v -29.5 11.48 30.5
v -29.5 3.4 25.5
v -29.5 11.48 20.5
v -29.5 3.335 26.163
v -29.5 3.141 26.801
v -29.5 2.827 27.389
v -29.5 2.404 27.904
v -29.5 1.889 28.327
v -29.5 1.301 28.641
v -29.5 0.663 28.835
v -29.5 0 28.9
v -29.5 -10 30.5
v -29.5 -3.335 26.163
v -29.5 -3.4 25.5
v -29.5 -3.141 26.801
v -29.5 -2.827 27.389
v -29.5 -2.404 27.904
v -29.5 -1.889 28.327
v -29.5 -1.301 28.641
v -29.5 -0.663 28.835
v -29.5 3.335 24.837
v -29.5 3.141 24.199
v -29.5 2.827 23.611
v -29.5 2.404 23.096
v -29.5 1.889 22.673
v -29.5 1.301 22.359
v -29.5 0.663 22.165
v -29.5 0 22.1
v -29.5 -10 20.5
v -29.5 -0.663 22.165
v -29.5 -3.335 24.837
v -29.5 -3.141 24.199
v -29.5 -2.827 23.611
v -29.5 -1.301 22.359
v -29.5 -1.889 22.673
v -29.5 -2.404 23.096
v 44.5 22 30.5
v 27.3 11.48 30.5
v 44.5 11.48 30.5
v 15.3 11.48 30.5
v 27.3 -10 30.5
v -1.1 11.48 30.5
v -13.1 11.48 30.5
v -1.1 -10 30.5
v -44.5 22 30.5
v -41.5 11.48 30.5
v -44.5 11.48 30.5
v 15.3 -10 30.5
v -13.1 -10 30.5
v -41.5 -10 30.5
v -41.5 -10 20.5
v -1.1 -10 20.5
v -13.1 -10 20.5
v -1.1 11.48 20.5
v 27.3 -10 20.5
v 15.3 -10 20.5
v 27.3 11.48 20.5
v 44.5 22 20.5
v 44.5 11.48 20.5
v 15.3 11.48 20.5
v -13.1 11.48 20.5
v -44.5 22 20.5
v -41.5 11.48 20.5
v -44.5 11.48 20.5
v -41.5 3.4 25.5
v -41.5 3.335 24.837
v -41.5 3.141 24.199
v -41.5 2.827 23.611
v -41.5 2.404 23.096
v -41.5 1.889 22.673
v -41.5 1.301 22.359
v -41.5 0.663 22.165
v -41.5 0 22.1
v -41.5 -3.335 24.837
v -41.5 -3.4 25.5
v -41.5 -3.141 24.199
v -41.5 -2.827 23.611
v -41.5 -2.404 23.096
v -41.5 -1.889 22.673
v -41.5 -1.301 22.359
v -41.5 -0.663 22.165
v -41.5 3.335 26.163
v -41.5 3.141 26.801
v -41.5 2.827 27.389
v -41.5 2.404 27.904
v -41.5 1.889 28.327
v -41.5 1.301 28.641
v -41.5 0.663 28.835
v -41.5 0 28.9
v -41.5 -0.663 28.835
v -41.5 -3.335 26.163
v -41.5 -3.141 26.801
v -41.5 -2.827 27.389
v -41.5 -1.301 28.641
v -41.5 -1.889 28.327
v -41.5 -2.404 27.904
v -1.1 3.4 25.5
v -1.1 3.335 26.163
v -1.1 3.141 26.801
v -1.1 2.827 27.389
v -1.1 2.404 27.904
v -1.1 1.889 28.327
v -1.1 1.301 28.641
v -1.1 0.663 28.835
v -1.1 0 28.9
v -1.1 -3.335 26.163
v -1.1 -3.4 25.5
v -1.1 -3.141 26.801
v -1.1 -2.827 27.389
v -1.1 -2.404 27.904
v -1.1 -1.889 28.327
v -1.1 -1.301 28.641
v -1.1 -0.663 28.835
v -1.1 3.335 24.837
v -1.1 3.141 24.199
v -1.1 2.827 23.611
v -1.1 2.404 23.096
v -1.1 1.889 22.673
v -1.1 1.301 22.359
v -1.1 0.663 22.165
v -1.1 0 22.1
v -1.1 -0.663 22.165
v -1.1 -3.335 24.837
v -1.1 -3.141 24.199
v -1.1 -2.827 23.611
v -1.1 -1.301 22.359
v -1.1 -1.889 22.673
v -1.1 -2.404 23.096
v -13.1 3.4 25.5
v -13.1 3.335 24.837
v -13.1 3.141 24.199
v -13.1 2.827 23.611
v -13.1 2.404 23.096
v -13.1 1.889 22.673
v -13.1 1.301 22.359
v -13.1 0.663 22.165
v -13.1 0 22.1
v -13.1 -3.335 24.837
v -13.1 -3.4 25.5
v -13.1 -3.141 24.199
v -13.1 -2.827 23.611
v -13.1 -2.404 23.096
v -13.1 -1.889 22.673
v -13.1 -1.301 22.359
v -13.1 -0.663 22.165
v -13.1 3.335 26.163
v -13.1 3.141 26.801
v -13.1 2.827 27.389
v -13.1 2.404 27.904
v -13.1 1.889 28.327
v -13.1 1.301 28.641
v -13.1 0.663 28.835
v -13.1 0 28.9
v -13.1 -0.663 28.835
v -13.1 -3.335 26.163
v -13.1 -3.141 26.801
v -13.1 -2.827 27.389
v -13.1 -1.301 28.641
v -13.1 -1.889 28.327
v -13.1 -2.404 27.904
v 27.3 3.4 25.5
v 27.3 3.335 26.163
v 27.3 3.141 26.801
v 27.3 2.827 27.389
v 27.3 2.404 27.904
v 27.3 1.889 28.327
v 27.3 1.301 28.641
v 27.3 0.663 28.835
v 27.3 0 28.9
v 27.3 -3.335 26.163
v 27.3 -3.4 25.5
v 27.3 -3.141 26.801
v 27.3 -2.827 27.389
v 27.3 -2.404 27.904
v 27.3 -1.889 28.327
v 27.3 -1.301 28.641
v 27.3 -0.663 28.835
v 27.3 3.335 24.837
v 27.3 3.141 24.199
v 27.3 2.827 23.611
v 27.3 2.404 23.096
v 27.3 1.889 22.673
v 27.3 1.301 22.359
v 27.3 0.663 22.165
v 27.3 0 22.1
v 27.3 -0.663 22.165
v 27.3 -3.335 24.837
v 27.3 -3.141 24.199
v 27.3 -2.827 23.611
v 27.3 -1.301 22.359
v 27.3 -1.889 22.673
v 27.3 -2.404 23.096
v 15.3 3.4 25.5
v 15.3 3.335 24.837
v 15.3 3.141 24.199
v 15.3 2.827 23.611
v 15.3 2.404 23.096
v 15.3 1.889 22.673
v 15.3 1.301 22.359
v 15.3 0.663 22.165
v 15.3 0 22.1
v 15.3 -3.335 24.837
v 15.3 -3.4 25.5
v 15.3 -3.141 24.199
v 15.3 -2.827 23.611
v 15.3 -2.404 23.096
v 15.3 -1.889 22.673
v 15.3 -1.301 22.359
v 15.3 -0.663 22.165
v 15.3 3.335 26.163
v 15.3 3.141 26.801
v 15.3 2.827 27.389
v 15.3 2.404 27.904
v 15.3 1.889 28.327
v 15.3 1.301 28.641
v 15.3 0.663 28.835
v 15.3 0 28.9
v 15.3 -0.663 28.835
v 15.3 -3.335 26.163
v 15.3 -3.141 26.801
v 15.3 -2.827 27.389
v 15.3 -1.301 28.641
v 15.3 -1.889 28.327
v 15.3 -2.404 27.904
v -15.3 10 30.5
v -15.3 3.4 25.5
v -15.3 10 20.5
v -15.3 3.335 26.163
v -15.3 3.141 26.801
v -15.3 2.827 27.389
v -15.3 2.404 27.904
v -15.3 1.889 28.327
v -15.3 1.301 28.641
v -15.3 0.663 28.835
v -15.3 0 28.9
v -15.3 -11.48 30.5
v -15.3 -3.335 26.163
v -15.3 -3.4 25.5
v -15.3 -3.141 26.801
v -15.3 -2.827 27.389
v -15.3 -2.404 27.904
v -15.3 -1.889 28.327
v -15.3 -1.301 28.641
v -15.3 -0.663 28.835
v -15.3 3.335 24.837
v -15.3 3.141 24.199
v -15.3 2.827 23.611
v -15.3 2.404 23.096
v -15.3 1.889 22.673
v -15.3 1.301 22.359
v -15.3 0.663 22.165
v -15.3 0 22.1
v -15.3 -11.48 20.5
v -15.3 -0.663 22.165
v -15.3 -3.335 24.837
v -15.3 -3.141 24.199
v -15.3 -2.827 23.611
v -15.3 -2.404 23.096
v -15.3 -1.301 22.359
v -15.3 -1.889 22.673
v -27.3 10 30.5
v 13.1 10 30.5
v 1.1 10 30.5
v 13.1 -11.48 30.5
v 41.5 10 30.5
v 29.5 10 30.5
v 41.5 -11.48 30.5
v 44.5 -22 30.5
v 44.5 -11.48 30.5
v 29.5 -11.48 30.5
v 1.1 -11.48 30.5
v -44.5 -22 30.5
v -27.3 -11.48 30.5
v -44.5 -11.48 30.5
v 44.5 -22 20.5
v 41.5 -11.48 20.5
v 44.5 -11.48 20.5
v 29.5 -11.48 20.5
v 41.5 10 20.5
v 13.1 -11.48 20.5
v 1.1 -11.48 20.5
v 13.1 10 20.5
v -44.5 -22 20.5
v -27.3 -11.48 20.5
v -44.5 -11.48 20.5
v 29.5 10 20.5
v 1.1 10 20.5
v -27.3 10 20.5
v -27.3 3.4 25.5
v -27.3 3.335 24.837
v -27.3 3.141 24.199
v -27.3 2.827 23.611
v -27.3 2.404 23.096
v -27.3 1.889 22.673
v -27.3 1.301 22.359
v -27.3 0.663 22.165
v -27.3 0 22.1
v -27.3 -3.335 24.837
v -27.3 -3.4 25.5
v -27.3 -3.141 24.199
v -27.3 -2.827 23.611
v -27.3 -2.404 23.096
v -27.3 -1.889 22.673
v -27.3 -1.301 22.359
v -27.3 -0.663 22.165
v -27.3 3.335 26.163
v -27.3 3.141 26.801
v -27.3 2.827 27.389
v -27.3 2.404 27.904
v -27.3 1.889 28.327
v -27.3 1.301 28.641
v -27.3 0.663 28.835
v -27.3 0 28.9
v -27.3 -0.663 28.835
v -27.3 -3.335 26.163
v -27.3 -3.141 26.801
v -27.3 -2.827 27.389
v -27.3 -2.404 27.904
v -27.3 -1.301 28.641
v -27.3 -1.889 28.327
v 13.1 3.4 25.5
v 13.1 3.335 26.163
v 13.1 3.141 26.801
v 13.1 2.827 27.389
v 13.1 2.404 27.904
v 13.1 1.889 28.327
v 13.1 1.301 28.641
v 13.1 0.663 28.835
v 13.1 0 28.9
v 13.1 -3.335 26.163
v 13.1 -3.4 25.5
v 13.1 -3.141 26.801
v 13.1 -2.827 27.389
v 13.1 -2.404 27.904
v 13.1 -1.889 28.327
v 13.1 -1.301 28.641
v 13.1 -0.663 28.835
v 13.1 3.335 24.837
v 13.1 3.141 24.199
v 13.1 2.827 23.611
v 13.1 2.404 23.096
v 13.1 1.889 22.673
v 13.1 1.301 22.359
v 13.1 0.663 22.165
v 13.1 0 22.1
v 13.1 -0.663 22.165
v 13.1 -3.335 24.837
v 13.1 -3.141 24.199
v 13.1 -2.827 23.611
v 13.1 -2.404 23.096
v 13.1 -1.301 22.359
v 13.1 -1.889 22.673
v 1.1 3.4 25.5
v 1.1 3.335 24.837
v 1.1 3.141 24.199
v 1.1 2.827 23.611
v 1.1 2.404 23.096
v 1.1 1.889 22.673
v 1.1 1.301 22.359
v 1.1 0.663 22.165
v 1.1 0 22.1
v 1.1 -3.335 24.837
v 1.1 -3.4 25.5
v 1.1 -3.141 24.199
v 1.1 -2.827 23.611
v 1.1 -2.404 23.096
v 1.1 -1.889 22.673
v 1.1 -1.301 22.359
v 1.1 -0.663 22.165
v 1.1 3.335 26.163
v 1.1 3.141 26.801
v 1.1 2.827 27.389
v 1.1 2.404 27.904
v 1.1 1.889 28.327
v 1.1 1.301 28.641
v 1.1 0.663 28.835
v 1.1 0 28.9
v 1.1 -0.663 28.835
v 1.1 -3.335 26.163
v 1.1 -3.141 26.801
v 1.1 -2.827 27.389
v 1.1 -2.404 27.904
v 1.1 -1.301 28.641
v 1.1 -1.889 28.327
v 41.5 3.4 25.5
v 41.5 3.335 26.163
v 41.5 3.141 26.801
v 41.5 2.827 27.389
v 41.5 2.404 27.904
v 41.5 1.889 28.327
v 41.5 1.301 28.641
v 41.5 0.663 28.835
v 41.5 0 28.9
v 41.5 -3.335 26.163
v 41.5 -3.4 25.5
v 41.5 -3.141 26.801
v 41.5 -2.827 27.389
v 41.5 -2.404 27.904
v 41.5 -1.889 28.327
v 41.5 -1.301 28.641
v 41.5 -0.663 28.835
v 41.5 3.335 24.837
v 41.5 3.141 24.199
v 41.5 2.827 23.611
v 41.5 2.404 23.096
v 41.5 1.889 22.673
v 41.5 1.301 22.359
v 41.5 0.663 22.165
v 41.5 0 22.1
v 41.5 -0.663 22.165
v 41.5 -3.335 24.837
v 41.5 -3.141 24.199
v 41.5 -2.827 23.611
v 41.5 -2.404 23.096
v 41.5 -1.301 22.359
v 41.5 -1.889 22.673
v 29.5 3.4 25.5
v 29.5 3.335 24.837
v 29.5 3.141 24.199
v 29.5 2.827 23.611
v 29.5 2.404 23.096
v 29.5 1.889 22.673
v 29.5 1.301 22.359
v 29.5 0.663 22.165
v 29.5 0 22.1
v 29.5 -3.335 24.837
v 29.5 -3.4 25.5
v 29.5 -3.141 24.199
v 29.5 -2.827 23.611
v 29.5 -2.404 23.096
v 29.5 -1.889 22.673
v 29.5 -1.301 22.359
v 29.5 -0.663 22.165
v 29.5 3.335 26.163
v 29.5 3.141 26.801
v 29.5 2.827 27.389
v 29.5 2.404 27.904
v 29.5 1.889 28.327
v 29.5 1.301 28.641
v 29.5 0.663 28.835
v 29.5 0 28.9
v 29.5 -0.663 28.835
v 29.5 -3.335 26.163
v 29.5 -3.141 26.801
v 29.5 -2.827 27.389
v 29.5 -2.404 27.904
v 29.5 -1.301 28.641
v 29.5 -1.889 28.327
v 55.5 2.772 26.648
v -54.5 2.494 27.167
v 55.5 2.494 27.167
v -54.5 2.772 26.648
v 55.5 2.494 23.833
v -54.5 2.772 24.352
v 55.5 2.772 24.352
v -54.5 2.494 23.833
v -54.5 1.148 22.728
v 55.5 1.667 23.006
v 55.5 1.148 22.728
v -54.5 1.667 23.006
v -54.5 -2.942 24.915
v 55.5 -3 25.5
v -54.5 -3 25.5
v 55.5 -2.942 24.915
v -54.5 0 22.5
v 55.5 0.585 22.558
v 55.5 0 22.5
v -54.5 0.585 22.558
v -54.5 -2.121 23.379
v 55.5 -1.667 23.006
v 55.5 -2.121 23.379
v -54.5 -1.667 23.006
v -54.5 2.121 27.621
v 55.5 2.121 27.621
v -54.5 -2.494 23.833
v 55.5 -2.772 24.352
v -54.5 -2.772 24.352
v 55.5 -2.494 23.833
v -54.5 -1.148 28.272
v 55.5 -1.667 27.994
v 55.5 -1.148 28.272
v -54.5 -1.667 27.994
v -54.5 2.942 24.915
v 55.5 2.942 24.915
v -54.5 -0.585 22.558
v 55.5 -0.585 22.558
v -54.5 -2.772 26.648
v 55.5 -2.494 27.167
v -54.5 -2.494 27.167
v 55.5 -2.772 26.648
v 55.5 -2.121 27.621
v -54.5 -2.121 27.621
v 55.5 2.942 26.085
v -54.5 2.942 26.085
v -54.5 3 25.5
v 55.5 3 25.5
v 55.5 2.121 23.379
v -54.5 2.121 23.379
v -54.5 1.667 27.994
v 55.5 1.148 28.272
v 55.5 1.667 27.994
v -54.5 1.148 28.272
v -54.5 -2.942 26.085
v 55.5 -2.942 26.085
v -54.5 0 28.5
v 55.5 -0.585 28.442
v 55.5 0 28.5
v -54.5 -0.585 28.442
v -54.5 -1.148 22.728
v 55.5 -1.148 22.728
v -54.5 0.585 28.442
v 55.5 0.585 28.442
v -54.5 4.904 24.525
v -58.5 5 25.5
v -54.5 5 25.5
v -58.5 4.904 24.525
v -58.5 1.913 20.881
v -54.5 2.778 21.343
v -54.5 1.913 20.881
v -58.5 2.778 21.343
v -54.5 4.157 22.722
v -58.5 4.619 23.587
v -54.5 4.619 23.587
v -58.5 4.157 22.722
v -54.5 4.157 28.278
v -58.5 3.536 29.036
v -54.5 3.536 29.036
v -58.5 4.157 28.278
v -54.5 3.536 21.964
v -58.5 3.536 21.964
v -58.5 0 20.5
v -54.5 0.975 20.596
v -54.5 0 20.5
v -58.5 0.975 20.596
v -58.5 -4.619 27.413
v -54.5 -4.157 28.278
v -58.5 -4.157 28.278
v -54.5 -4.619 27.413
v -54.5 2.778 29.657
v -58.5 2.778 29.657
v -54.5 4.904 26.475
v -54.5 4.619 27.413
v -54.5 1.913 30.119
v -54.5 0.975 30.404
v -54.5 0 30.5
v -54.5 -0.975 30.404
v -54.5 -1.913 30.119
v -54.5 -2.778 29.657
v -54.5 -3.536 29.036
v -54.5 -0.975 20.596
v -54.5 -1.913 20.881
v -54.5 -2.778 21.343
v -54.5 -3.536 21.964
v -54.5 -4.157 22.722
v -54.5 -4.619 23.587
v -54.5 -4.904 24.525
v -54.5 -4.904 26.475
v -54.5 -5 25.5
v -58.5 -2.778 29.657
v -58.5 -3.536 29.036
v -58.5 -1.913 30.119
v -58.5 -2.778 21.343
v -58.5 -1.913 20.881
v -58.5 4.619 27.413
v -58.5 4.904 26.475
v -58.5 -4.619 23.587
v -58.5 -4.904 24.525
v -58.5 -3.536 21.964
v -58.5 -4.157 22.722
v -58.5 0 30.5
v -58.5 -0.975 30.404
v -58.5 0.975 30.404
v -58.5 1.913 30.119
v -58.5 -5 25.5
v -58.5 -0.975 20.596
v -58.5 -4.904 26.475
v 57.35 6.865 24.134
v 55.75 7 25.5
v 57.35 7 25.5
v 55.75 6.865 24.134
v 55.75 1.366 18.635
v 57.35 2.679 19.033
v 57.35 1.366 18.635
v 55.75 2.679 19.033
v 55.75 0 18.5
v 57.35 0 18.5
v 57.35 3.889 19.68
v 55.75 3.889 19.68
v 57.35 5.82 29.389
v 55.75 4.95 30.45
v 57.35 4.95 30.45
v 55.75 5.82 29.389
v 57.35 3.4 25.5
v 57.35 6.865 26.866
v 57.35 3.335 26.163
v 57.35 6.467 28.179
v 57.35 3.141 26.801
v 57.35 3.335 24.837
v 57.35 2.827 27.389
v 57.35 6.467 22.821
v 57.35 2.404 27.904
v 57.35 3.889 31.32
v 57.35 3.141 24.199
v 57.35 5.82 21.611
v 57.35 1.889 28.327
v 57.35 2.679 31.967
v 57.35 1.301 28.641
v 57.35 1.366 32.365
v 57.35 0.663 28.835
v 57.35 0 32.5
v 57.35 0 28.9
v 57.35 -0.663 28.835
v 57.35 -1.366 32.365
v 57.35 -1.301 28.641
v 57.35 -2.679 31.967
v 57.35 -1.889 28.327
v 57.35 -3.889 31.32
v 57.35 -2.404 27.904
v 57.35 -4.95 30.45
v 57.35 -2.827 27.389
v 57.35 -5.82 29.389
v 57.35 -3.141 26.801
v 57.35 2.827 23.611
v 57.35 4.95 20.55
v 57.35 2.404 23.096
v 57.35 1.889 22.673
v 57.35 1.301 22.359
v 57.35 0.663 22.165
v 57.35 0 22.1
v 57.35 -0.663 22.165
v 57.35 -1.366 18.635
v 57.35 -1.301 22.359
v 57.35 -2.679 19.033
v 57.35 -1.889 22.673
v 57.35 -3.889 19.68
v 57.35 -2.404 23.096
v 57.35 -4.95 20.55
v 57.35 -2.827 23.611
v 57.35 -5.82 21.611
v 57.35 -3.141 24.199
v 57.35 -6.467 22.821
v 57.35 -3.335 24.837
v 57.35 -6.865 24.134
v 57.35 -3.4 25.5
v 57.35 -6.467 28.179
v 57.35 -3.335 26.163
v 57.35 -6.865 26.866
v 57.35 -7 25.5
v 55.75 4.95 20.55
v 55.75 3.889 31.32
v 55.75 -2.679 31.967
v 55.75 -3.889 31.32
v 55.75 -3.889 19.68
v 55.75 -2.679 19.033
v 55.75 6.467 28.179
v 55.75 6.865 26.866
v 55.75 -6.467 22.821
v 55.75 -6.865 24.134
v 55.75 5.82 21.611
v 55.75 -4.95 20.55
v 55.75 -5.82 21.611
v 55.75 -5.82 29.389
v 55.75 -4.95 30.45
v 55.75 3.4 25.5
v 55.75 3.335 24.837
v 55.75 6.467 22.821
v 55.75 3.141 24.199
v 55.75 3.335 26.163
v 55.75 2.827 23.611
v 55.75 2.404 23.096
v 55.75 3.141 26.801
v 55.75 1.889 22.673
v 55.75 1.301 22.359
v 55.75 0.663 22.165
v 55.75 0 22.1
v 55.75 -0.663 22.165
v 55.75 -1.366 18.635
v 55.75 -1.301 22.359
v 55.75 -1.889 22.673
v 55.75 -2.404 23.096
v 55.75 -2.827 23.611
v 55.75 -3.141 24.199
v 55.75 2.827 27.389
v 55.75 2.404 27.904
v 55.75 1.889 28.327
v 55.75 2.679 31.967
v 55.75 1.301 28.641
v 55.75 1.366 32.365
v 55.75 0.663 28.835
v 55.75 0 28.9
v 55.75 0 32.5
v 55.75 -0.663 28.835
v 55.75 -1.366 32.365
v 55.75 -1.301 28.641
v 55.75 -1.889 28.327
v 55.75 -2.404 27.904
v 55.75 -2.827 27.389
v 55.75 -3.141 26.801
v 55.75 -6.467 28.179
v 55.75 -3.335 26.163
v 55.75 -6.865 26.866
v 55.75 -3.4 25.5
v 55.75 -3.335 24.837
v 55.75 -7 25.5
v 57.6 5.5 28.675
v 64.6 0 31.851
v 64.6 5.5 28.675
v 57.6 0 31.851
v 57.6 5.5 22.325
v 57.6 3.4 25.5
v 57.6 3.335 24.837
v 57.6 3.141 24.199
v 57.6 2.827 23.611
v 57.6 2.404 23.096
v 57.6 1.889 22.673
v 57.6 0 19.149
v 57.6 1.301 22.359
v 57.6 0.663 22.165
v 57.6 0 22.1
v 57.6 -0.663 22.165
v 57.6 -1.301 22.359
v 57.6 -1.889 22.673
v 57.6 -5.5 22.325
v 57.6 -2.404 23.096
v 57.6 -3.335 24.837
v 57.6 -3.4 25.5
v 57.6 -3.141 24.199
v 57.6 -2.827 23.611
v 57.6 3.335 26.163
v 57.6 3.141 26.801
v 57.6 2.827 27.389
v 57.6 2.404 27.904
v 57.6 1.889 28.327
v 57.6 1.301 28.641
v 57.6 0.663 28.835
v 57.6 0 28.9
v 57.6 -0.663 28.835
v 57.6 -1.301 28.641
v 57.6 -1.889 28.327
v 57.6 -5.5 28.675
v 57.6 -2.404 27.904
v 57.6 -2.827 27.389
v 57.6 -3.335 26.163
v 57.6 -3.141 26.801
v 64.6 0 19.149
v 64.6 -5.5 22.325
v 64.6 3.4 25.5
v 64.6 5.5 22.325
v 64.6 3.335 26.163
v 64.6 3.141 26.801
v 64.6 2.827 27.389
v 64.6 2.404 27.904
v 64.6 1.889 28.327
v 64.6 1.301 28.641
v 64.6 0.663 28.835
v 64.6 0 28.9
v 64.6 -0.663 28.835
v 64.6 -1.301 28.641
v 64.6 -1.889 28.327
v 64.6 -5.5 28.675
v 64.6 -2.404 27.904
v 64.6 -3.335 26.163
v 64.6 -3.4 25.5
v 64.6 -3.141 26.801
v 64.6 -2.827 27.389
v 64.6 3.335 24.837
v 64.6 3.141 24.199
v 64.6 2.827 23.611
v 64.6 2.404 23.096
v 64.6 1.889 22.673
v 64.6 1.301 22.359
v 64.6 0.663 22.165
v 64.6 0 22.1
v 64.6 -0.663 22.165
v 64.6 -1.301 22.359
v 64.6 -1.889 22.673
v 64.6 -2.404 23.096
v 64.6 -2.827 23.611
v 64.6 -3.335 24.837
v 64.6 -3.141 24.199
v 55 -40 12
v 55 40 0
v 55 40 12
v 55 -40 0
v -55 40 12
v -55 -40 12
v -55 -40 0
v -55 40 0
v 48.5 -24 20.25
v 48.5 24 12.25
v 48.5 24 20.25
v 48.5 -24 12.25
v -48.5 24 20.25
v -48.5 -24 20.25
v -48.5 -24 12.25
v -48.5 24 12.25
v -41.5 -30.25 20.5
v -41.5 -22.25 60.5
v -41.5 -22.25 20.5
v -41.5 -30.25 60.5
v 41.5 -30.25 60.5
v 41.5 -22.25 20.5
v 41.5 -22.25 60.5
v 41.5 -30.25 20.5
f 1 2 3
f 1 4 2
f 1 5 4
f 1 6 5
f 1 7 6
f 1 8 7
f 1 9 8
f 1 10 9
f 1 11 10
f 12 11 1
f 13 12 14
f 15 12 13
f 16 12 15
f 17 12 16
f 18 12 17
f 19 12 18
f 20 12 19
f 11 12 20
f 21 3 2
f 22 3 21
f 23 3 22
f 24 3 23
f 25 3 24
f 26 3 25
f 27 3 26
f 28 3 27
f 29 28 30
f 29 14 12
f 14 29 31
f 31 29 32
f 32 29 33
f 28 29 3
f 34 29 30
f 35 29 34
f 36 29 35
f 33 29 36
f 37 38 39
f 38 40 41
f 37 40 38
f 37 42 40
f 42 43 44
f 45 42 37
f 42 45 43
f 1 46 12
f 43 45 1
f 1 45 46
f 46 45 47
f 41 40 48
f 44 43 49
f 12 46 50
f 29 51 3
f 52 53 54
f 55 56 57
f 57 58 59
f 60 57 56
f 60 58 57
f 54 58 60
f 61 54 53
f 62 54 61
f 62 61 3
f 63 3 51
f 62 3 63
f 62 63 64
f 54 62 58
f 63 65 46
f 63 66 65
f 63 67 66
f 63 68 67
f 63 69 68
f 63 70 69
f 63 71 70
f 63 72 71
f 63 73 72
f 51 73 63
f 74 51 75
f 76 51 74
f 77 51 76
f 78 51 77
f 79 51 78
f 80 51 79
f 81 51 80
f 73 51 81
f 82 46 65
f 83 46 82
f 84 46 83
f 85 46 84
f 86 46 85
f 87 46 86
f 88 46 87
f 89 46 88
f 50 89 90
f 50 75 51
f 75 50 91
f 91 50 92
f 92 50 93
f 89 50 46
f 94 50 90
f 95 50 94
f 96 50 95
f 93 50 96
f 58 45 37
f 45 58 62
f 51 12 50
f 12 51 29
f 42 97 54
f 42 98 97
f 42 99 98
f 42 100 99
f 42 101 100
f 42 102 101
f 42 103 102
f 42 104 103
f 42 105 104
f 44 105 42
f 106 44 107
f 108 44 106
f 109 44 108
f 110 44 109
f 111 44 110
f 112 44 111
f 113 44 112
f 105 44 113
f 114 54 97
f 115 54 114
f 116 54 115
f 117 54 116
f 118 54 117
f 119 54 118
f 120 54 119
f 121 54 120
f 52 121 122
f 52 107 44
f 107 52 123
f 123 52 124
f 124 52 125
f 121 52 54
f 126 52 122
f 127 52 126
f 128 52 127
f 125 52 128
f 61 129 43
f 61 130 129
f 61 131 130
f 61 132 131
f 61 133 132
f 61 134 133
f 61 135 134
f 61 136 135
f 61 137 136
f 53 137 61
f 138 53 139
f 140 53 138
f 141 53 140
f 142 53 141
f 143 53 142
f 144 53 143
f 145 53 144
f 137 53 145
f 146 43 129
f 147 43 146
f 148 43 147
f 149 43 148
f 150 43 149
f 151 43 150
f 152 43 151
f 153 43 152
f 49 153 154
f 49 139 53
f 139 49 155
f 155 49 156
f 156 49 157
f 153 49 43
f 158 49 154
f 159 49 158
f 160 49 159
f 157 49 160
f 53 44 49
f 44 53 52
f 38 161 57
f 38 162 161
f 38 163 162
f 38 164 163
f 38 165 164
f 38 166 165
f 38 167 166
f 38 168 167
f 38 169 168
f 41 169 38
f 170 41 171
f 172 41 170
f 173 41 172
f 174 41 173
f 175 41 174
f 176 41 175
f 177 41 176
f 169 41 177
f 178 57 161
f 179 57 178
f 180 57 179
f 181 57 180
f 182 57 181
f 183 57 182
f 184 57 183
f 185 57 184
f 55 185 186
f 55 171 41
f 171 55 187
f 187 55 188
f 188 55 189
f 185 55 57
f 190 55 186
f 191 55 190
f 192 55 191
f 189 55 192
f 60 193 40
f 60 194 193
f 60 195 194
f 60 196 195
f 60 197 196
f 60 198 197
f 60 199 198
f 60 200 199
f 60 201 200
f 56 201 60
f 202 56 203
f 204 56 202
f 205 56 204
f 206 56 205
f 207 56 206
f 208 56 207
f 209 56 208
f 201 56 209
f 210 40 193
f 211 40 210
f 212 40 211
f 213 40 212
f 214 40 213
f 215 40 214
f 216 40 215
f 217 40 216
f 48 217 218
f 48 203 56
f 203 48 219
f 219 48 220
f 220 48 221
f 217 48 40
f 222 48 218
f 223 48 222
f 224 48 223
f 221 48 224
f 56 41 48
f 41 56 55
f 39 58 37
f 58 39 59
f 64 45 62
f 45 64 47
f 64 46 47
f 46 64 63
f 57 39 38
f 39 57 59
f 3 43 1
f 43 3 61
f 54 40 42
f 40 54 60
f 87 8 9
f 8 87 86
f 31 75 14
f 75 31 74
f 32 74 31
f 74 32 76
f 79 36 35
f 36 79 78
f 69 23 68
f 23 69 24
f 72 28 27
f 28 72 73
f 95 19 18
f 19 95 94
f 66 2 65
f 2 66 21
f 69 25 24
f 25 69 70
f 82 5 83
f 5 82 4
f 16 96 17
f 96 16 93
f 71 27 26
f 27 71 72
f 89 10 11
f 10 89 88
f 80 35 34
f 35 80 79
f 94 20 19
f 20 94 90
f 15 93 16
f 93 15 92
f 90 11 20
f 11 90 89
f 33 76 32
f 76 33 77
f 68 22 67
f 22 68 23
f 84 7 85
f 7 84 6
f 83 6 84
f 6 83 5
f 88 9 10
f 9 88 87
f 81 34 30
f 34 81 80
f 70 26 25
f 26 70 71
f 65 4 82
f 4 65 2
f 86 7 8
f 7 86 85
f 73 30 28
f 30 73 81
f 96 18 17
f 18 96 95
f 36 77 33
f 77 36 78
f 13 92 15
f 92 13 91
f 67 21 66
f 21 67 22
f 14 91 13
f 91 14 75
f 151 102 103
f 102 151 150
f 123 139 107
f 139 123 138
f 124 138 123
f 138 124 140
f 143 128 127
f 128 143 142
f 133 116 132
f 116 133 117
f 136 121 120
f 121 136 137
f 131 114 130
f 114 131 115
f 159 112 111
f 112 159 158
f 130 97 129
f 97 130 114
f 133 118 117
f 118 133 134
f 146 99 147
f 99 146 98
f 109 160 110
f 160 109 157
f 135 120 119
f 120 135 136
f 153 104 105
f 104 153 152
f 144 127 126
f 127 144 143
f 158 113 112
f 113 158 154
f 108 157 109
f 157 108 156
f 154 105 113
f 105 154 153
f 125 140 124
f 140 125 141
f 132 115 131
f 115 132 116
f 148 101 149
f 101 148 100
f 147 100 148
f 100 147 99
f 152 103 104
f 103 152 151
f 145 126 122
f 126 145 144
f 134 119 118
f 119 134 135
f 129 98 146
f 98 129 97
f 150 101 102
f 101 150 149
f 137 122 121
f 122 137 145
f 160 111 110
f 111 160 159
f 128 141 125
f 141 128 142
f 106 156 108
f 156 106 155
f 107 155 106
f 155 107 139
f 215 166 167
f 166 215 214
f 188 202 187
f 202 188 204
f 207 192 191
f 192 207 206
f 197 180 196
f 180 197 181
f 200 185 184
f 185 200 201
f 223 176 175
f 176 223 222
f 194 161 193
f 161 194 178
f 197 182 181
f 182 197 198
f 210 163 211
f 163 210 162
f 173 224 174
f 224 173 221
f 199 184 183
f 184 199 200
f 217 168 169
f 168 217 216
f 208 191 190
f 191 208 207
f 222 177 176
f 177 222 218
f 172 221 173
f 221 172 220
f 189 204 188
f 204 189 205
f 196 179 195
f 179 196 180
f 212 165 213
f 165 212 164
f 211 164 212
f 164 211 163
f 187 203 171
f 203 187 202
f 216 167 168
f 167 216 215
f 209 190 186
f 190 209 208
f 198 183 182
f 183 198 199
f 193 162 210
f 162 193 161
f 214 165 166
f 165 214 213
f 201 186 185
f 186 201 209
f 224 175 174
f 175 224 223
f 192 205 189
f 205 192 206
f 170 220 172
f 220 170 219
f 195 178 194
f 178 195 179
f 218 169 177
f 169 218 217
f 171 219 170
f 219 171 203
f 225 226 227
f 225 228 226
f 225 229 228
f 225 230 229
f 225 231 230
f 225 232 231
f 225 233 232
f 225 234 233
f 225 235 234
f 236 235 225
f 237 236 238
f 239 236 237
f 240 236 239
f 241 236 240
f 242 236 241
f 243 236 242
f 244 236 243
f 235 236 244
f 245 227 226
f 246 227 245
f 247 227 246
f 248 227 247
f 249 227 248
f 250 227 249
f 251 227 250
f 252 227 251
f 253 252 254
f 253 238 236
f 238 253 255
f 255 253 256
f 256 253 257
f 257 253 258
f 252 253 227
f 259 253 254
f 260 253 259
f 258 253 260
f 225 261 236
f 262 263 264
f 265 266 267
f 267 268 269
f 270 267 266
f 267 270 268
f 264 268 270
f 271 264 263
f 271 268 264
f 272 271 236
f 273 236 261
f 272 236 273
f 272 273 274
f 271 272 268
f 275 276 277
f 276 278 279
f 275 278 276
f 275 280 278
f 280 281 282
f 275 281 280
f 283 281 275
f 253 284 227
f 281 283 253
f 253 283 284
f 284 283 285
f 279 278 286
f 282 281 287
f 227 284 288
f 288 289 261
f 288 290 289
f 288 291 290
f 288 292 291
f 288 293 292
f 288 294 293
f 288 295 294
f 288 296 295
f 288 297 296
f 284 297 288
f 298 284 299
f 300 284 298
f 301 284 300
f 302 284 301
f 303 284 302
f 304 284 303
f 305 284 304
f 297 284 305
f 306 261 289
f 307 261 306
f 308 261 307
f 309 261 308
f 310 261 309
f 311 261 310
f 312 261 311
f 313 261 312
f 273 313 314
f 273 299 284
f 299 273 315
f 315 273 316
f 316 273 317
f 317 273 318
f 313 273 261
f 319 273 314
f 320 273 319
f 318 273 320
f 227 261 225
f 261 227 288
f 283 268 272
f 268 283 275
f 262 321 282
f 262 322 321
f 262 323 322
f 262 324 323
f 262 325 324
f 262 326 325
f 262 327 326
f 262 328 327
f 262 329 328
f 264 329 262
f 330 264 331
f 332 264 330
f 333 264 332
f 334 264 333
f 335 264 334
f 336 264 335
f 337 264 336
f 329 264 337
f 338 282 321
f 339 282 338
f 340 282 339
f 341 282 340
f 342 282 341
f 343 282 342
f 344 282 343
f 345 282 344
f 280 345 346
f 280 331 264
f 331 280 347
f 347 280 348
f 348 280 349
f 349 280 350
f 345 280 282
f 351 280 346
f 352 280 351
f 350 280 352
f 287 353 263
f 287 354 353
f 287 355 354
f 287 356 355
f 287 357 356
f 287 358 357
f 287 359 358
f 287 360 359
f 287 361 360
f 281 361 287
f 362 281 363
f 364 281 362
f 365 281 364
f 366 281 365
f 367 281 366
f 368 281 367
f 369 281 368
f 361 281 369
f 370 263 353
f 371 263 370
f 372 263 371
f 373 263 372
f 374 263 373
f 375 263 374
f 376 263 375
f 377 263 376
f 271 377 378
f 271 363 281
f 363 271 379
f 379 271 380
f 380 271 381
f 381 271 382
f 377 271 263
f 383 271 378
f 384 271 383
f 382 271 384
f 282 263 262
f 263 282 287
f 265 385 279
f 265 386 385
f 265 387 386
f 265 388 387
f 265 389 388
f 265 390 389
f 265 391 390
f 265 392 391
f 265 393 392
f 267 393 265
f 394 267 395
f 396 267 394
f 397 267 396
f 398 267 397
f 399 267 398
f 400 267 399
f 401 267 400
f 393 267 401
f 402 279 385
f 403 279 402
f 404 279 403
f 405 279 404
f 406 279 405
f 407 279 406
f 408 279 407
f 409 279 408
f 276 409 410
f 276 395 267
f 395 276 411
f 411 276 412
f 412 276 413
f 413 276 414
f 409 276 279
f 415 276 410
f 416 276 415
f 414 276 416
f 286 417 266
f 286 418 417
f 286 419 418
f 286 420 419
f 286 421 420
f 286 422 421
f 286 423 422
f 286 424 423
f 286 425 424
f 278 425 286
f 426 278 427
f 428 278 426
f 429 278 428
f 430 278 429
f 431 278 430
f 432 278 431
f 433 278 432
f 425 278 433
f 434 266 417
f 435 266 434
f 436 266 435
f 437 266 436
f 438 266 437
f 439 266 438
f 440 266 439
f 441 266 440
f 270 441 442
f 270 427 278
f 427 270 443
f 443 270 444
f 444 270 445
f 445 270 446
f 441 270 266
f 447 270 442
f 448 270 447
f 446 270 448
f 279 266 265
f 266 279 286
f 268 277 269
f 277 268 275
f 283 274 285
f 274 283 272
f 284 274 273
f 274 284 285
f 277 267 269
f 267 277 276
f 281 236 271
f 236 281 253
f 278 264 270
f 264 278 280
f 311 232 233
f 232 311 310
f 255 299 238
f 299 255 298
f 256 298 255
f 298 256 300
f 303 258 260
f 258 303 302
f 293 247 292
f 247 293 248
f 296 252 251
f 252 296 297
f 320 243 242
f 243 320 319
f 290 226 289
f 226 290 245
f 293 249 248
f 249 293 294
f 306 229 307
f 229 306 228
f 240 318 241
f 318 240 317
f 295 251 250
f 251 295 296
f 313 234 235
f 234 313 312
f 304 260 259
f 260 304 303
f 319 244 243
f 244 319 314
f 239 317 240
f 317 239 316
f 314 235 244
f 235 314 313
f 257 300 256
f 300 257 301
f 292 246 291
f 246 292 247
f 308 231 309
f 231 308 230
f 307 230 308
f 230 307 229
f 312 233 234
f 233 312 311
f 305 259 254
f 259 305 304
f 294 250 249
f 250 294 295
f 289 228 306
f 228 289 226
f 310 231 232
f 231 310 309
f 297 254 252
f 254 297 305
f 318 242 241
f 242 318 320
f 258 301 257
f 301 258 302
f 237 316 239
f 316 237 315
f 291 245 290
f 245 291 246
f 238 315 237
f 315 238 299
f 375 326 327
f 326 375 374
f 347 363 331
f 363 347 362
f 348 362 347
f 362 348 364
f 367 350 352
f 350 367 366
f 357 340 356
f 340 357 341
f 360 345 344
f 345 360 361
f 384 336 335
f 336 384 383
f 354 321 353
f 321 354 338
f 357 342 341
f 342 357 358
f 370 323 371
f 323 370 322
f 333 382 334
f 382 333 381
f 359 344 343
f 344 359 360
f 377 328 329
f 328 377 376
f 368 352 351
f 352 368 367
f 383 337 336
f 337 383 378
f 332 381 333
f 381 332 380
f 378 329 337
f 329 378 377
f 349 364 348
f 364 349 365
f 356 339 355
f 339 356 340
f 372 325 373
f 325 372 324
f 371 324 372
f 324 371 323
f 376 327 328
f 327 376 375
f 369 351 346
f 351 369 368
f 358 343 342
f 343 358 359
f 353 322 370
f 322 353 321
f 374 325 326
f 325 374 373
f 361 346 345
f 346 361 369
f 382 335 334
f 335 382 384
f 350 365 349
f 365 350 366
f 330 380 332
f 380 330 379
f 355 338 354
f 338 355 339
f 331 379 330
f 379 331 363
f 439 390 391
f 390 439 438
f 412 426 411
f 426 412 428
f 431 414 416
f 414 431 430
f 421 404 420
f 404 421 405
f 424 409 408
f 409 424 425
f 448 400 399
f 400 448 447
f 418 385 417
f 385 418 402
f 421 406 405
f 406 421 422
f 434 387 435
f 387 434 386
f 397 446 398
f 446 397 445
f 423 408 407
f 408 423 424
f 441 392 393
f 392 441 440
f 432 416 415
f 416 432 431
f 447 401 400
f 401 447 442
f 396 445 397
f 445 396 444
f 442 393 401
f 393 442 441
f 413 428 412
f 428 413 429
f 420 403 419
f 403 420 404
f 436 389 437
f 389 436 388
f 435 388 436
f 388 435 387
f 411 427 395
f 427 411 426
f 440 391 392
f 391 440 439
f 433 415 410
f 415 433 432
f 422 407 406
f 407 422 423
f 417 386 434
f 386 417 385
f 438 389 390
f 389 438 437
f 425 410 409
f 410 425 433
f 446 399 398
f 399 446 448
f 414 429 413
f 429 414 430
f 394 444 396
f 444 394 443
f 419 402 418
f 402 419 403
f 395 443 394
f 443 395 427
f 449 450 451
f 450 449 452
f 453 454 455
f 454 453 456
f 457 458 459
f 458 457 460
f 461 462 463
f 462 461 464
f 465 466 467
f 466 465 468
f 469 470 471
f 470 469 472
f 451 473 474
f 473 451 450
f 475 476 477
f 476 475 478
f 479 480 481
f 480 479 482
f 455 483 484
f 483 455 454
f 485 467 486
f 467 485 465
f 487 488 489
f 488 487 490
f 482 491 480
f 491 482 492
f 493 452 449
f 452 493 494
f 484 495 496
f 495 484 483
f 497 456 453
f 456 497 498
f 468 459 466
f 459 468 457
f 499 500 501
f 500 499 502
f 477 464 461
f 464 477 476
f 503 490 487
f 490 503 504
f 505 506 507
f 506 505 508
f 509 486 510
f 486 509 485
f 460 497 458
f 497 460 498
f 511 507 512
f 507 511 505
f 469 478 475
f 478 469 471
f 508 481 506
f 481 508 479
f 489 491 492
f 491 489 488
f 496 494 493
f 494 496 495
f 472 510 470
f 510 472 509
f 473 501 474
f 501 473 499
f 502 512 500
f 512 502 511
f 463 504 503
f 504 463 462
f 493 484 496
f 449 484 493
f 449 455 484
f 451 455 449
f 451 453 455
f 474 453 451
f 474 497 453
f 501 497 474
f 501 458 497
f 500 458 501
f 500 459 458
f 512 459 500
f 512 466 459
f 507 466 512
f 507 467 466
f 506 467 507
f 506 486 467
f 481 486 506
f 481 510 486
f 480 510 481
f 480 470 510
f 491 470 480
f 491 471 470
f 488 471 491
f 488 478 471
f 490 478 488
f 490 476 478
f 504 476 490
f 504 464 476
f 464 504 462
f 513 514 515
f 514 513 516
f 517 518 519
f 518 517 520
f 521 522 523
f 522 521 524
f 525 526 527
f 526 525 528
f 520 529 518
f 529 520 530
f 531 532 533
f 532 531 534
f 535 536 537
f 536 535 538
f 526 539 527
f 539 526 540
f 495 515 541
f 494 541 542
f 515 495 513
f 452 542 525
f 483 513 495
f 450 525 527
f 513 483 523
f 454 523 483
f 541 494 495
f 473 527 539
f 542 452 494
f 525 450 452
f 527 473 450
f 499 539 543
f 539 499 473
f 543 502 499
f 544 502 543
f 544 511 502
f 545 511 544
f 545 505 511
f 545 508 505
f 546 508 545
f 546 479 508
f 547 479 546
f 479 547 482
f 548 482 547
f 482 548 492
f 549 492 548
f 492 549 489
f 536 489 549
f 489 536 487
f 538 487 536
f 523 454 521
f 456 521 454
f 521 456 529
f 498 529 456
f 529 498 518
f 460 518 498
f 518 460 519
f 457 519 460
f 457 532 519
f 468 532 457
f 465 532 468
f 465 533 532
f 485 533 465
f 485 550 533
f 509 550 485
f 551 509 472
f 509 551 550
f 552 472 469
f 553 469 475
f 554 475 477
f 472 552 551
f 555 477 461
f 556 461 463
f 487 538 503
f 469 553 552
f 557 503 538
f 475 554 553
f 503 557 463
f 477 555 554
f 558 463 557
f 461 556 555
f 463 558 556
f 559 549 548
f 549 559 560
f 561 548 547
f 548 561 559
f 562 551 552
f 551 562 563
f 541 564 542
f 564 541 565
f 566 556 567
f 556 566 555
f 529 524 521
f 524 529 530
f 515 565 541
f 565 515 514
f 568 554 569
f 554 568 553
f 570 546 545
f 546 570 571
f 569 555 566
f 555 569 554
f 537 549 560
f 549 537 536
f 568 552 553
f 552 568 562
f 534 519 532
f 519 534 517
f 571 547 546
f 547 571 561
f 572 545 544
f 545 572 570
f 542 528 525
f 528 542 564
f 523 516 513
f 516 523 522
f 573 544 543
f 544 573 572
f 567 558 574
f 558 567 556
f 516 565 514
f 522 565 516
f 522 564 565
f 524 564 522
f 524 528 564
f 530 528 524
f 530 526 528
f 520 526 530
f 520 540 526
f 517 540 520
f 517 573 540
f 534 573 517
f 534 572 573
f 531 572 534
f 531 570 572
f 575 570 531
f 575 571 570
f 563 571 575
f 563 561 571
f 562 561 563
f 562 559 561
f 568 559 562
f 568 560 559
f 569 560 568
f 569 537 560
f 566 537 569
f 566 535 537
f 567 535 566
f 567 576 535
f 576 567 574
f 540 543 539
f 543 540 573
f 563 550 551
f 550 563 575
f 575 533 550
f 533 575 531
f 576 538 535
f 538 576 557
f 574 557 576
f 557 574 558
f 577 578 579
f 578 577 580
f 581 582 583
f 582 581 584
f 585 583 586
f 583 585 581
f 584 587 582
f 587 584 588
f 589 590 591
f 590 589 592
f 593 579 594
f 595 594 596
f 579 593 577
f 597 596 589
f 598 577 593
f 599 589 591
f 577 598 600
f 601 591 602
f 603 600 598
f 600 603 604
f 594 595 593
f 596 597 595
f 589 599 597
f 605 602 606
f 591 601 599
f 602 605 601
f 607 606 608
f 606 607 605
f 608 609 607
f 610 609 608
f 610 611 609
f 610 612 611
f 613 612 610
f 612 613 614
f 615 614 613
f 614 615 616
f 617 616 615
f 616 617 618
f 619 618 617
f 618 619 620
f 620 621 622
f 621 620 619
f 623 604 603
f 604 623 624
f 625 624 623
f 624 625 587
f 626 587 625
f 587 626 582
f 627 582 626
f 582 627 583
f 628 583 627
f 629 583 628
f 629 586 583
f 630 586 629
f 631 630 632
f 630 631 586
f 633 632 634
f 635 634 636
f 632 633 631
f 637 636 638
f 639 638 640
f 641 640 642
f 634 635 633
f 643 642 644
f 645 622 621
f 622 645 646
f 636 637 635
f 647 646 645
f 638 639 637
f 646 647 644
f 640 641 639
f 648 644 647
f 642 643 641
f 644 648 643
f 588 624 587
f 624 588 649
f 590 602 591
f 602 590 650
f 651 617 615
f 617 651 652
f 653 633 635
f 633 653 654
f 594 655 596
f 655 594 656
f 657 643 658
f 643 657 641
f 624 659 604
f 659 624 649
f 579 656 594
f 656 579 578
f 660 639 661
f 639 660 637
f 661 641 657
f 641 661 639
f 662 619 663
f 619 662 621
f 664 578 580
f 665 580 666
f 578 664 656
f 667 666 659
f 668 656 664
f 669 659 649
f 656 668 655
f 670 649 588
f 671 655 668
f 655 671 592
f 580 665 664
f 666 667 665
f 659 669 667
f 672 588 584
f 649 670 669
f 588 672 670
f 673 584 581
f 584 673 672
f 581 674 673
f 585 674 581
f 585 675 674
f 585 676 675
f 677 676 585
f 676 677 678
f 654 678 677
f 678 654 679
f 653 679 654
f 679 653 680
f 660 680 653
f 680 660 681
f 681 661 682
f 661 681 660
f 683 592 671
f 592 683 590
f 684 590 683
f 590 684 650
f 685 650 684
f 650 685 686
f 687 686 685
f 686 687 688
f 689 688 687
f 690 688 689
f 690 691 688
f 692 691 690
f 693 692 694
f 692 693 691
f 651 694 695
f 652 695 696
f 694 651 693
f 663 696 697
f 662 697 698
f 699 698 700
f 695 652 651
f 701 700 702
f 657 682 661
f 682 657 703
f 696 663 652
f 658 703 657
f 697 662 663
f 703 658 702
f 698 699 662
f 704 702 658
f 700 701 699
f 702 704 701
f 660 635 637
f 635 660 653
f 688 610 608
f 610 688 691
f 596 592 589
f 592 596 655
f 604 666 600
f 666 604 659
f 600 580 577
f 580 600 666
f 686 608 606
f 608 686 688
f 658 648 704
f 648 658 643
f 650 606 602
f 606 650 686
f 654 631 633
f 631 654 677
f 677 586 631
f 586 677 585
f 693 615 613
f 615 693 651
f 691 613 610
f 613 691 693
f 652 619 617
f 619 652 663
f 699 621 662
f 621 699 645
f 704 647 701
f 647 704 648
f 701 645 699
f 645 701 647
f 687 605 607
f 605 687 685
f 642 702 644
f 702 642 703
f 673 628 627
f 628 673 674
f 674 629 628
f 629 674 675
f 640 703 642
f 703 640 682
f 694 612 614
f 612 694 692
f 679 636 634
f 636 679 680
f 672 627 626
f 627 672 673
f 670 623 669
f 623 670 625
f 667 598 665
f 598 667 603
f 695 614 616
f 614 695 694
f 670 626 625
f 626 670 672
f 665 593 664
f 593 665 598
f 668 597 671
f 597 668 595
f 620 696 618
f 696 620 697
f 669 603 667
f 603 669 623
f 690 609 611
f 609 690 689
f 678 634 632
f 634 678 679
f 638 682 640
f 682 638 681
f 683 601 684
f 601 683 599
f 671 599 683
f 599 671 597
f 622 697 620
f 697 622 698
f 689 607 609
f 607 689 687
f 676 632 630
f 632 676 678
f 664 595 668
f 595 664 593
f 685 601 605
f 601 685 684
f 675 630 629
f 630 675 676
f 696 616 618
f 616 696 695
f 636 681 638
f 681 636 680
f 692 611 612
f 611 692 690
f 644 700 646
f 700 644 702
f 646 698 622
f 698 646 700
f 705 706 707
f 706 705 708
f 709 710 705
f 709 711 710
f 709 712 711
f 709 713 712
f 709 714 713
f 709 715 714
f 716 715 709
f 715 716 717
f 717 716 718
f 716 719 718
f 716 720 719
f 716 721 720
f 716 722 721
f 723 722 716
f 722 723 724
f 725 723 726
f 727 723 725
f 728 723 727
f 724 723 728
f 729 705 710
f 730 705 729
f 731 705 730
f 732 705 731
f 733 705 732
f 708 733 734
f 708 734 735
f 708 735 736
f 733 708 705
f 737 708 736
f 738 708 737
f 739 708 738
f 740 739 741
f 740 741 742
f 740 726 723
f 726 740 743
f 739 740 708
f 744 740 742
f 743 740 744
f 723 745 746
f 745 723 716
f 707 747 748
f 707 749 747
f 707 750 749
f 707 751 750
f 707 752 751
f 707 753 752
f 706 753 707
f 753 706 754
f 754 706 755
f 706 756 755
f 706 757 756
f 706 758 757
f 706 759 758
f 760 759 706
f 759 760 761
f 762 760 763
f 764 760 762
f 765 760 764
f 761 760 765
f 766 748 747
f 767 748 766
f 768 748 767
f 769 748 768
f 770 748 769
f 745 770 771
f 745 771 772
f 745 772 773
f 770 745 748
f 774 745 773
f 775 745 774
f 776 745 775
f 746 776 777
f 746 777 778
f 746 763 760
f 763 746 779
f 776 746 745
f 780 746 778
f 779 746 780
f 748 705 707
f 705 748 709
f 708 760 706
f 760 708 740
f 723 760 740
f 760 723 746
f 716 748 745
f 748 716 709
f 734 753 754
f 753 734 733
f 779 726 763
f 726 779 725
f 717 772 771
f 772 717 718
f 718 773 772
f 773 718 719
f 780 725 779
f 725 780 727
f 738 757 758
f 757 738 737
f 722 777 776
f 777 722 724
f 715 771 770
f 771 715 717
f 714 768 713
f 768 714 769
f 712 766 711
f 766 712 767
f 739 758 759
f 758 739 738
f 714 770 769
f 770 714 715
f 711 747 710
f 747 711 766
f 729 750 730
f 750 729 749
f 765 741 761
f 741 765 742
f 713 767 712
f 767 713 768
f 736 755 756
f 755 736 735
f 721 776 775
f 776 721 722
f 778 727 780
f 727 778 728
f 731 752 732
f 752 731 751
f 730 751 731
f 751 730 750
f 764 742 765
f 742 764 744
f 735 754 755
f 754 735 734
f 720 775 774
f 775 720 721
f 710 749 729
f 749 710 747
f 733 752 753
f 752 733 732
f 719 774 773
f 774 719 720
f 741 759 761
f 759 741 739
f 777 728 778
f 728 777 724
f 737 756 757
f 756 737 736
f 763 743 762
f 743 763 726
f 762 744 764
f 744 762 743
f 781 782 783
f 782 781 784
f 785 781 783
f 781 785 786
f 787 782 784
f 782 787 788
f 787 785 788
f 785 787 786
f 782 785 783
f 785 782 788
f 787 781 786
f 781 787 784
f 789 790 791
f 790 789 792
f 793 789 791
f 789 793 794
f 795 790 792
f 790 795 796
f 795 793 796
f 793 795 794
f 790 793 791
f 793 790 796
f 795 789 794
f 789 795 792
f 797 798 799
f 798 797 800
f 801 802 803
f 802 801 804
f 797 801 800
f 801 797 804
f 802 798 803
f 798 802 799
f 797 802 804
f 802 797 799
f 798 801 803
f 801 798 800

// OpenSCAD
$fn = 32;

// ------------------------------------------------------------------------
// Comb hinge with flap: leaf 89 x 22 mm, pin d6, flap 40 mm
// Every part is its own module, assembly() places every instance.
// ------------------------------------------------------------------------

// --- part 1 ---
module hinge_bed() {
  difference() {
    translate([-55, -40, 0]) cube([110, 80, 12]);
  }
}

// --- part 2 ---
module hinge_riser() {
  difference() {
    translate([-48.5, -24, 0]) cube([97, 48, 8]);
  }
}

// --- part 3 ---
module hinge_leaf_a() {
  difference() {
    union() {
      translate([-41.5, -10, -5]) cube([12, 32, 10]);
      translate([-13.1, -10, -5]) cube([12, 32, 10]);
      translate([15.3, -10, -5]) cube([12, 32, 10]);
      translate([-44.5, 11.48, -5]) cube([89, 10.52, 10]);
    }
    translate([-35.5, 0, 0]) rotate([0, 90, 0]) cylinder(h = 14, d = 6.8, center = true);
    translate([-7.1, 0, 0]) rotate([0, 90, 0]) cylinder(h = 14, d = 6.8, center = true);
    translate([21.3, 0, 0]) rotate([0, 90, 0]) cylinder(h = 14, d = 6.8, center = true);
  }
}

// --- part 4 ---
module hinge_leaf_b() {
  difference() {
    union() {
      translate([-27.3, -22, -5]) cube([12, 32, 10]);
      translate([1.1, -22, -5]) cube([12, 32, 10]);
      translate([29.5, -22, -5]) cube([12, 32, 10]);
      translate([-44.5, -22, -5]) cube([89, 10.52, 10]);
    }
    translate([-21.3, 0, 0]) rotate([0, 90, 0]) cylinder(h = 14, d = 6.8, center = true);
    translate([7.1, 0, 0]) rotate([0, 90, 0]) cylinder(h = 14, d = 6.8, center = true);
    translate([35.5, 0, 0]) rotate([0, 90, 0]) cylinder(h = 14, d = 6.8, center = true);
  }
}

// --- part 5 ---
module hinge_flap() {
  difference() {
    translate([-41.5, -20, 0]) cube([83, 40, 8]);
  }
}

// --- part 6 ---
module hinge_pin() {
  rotate([0, 90, 0]) cylinder(h = 111, d = 6, center = true);
  translate([-58.5, 0, 0]) rotate([0, 90, 0]) cylinder(h = 4, d = 10);
}

// --- part 7 ---
module pin_washer() {
  difference() {
      translate([0, 0, 0]) cylinder(h = 1.6, d = 14);
      translate([0, 0, -1]) cylinder(h = 3.6, d = 6.8);
    }
}

// --- part 8 ---
module pin_nut() {
  difference() {
    linear_extrude(height = 7) polygon(points = [[6.351, 0], [3.175, 5.5], [-3.175, 5.5], [-6.351, 0], [-3.175, -5.5], [3.175, -5.5]]);
    translate([0, 0, -1]) cylinder(h = 9, d = 6.8);
  }
}

// --- assembly ---
module assembly() {
  color([0.80, 0.24, 0.20]) translate([0, 0, 0]) rotate([0, 0, 0]) hinge_bed();
  color([0.20, 0.45, 0.75]) translate([0, 0, 12.25]) rotate([0, 0, 0]) hinge_riser();
  color([0.25, 0.62, 0.32]) translate([0, 0, 25.5]) rotate([0, 0, 0]) hinge_leaf_a();
  color([0.92, 0.70, 0.18]) translate([0, 0, 25.5]) rotate([0, 0, 0]) hinge_leaf_b();
  color([0.58, 0.35, 0.70]) translate([0, -22.25, 40.5]) rotate([90, 0, 0]) hinge_flap();
  color([0.16, 0.66, 0.66]) translate([0, 0, 25.5]) rotate([0, 0, 0]) hinge_pin();
  color([0.85, 0.48, 0.18]) translate([55.75, 0, 25.5]) rotate([0, 90, 0]) pin_washer();
  color([0.55, 0.60, 0.65]) translate([57.6, 0, 25.5]) rotate([0, 90, 0]) pin_nut();
}

assembly();
